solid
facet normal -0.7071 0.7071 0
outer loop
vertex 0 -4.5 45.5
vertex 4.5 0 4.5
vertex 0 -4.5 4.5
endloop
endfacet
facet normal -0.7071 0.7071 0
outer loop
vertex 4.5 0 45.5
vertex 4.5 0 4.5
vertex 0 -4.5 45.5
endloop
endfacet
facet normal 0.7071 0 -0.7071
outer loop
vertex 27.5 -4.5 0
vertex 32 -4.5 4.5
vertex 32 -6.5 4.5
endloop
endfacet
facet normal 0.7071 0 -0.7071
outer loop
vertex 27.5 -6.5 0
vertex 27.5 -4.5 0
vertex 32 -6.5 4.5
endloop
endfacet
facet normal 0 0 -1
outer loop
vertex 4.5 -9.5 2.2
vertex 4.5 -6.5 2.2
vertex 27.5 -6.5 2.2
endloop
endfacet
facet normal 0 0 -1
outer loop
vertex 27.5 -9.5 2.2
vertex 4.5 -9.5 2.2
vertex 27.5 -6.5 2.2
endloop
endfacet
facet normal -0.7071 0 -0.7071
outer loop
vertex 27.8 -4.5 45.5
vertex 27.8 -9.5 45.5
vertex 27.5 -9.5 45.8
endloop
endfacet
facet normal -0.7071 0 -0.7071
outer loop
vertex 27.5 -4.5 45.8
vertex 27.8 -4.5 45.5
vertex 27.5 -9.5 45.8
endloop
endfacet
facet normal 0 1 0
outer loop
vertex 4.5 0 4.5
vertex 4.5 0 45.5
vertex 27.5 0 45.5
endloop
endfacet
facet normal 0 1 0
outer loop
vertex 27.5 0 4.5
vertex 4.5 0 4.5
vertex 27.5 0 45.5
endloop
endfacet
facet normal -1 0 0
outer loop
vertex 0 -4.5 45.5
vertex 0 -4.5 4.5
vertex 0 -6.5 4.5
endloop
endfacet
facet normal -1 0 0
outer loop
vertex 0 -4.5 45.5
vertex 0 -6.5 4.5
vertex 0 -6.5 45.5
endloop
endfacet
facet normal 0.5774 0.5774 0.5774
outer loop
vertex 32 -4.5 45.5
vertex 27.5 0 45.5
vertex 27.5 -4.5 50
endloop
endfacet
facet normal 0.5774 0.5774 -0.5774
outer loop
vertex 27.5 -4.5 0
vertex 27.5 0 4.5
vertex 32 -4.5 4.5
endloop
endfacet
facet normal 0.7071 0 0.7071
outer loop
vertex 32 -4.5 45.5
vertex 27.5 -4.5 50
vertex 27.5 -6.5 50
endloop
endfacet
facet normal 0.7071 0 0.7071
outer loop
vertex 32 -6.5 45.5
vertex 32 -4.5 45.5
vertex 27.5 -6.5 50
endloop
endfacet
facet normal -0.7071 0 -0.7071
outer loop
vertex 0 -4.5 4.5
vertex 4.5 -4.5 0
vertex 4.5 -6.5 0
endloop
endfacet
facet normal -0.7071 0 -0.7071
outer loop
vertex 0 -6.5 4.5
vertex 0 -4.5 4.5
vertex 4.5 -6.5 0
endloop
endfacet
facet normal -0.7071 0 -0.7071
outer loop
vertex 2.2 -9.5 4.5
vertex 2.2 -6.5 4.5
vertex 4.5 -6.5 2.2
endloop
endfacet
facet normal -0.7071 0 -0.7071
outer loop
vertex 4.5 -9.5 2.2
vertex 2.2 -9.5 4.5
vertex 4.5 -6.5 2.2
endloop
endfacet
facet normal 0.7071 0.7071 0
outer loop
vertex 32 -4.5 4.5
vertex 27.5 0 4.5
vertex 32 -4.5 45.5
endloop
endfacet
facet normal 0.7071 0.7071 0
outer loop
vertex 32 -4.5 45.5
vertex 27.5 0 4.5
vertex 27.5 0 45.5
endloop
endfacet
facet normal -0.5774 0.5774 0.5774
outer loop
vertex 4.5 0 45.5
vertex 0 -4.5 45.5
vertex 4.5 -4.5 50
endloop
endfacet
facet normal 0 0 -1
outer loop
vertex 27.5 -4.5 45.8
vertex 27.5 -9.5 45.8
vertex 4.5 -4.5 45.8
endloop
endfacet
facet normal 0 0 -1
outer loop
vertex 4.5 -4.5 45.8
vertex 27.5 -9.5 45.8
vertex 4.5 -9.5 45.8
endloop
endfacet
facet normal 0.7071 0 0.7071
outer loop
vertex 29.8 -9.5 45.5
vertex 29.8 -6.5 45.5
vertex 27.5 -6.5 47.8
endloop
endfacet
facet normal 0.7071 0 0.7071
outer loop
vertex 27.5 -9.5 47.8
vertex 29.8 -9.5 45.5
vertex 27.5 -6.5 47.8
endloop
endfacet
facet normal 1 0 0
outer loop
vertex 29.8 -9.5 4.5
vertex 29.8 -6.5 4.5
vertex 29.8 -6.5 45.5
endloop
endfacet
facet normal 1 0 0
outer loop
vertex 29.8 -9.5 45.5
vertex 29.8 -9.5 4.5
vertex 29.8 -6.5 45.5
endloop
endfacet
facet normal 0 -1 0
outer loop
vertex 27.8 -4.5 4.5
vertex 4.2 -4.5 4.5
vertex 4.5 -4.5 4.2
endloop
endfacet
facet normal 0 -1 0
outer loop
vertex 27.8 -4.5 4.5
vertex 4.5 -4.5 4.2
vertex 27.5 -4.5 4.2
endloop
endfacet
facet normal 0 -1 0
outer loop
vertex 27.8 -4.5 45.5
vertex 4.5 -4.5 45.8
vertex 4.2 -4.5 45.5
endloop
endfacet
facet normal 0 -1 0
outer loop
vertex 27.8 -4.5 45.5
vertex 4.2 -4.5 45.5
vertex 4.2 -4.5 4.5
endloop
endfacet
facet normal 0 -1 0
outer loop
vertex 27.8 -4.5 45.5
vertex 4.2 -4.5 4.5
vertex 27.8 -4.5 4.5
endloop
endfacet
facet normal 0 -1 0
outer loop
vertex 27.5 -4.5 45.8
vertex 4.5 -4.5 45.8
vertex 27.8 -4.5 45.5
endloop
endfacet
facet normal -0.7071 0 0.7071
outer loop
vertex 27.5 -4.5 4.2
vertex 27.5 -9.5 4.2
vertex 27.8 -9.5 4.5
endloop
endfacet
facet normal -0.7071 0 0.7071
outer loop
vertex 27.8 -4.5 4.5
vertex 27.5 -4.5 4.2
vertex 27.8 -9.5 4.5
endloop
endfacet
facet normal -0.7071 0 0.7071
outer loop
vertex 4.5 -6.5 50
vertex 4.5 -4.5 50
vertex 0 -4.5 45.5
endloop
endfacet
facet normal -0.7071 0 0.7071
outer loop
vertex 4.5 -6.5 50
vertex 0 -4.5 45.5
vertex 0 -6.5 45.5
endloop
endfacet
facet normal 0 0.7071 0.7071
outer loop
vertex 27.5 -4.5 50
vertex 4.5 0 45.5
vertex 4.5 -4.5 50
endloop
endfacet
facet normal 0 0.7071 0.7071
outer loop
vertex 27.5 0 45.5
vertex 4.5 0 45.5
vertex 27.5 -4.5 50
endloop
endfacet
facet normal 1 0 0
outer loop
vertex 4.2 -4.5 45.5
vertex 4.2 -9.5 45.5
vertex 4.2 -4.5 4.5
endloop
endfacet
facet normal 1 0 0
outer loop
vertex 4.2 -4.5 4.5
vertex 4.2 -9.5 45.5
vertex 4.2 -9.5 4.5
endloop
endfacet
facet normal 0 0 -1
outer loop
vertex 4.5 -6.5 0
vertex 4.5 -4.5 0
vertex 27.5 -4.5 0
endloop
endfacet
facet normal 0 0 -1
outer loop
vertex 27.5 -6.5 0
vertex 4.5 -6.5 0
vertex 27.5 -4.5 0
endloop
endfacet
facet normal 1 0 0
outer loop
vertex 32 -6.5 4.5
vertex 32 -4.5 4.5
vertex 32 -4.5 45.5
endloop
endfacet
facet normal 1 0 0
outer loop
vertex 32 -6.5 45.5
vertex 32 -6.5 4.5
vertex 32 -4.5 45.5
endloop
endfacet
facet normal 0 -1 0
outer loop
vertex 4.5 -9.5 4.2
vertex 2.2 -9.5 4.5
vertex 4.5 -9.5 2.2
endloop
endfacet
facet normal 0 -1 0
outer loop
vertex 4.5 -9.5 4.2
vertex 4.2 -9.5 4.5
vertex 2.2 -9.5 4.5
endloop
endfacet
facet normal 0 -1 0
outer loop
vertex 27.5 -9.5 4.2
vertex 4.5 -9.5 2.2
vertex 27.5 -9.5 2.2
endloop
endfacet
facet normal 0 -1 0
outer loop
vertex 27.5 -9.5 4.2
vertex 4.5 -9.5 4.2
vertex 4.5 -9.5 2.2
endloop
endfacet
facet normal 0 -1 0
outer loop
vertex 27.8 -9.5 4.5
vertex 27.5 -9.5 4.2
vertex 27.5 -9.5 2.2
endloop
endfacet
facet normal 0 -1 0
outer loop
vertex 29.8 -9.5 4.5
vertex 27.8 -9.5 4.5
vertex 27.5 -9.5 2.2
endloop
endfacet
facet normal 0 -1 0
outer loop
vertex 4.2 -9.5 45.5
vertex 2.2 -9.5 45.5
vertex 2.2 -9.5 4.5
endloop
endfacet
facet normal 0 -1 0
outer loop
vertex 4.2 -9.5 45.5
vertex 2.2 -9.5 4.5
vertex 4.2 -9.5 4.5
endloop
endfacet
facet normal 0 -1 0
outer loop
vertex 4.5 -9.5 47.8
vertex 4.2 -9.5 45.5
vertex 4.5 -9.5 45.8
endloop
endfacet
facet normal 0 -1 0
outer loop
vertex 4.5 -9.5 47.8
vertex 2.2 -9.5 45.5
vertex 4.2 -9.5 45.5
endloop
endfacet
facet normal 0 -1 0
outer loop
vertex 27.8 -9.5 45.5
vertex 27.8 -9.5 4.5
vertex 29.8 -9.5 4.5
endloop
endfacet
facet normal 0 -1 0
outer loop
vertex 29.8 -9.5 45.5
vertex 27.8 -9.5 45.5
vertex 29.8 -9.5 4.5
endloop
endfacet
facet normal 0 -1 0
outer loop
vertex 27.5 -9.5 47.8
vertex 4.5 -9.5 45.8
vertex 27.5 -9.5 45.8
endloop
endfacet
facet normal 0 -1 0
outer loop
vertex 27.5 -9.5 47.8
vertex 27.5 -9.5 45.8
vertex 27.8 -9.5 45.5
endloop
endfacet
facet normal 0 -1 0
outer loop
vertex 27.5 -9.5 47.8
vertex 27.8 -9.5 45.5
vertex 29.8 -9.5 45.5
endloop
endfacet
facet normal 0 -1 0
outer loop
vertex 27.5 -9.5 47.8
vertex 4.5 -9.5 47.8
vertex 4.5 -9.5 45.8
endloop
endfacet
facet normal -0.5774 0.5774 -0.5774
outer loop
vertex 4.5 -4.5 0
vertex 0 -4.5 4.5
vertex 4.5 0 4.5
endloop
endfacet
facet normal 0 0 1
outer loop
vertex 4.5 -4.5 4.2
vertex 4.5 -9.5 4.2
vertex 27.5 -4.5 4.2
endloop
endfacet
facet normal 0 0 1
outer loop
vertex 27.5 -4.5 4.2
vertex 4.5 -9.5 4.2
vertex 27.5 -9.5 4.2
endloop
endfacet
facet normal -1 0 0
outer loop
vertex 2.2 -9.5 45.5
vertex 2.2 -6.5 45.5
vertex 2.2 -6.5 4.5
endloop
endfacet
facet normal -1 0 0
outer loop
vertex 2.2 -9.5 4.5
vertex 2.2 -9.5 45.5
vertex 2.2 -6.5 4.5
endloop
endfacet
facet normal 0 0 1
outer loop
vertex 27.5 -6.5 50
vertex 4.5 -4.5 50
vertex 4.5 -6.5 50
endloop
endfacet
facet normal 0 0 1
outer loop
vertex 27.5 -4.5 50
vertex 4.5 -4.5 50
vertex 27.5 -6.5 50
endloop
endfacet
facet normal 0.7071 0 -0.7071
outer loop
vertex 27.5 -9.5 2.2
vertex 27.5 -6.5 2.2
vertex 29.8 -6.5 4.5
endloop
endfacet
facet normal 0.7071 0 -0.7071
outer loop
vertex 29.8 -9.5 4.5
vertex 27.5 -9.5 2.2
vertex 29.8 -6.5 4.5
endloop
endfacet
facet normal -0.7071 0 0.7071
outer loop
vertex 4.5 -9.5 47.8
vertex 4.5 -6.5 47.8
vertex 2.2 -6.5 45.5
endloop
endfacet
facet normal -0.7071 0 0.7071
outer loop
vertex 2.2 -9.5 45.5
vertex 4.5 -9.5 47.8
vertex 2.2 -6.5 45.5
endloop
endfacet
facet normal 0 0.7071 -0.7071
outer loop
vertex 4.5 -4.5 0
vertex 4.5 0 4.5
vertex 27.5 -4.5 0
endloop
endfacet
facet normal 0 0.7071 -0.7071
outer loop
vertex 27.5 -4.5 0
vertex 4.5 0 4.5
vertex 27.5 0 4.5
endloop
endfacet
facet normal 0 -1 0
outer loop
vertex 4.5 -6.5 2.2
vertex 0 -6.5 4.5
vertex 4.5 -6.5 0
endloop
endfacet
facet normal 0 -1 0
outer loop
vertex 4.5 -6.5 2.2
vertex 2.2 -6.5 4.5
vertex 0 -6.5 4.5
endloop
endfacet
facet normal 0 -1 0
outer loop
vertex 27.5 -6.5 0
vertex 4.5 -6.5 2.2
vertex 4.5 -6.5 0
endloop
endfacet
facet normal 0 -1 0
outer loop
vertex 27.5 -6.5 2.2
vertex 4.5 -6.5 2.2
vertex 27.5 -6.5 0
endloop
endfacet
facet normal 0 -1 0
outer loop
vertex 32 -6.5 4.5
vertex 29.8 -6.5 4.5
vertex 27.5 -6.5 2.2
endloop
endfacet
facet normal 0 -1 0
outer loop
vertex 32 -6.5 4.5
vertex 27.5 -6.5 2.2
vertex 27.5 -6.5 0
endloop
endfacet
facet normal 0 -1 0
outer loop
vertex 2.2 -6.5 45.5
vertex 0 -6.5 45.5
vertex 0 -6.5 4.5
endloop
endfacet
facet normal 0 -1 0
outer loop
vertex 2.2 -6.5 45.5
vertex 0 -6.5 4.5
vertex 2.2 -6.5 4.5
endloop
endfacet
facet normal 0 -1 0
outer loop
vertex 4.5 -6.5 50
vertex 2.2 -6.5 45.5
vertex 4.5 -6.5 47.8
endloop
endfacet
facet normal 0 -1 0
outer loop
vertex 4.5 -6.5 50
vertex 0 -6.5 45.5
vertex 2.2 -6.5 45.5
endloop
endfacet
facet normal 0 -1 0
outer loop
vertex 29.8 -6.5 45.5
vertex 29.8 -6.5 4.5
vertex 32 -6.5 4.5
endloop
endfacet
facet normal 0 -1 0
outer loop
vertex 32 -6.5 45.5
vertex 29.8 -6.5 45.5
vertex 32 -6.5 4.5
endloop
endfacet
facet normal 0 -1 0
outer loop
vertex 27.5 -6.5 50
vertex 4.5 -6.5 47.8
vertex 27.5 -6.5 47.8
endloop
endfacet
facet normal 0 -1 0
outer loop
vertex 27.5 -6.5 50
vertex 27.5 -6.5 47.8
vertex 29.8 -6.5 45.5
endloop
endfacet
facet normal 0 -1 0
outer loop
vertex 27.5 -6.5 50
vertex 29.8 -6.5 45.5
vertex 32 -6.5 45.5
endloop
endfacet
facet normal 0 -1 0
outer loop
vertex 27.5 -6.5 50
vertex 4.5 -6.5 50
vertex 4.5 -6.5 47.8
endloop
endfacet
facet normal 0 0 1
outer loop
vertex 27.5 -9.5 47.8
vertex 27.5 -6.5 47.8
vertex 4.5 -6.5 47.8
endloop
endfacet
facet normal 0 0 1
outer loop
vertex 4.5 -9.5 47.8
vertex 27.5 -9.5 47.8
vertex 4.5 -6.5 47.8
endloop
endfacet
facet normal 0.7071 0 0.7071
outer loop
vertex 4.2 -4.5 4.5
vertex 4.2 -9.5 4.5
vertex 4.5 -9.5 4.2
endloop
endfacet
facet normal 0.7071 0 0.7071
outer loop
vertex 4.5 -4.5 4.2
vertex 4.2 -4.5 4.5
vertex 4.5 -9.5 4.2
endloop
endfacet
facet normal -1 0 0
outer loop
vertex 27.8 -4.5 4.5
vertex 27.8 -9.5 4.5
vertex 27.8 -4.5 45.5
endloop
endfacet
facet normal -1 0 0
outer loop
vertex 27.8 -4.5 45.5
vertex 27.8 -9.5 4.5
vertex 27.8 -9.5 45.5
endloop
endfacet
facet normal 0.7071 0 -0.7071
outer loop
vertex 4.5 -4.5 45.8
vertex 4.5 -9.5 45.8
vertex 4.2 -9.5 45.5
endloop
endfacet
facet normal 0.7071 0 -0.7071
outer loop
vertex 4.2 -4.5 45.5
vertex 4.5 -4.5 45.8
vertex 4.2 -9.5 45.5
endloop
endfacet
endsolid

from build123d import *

# Parameters (mm, degrees)
F0_W     = 32
F0_H     = 50
F1_DEPTH = 15
F2_SIZE  = 4.5
F3_W     = 44.522483
F3_H     = 61.777794
F4_DEPTH = 8.5
F6_DEPTH = 3
F8_DEPTH = 5


with BuildPart() as f1:
    # F0 (on Front) → F1 (new body)
    with BuildSketch(Plane.XZ):
        with Locations((16, 25)):
            Rectangle(F0_W, F0_H)
    extrude(amount=F1_DEPTH)

    # F2
    f2_edges = [f1.edges().sort_by_distance(p)[0] for p in [
        (0, -7.5, 50),
        (0, -7.5, 0),
        (0, 0, 25),
        (0, -15, 25),
        (16, 0, 0),
        (32, 0, 25),
        (16, 0, 50),
        (32, -7.5, 50),
        (16, -15, 50),
        (32, -7.5, 0),
        (32, -15, 25),
        (16, -15, 0),
    ]]
    chamfer(f2_edges, length=F2_SIZE)

    # F3 (on face) → F4 (cut)
    with BuildSketch(Plane.XZ.offset(15)):
        with Locations((18.562658, 27.901019)):
            Rectangle(F3_W, F3_H)
    extrude(amount=-F4_DEPTH, mode=Mode.SUBTRACT)

    # F5 (on face) → F6 (join)
    with BuildSketch(Plane.XZ.offset(6.5)):
        Polygon((2.2, 4.5), (4.5, 2.2), (27.5, 2.2), (29.8, 4.5), (29.8, 45.5), (27.5, 47.8), (4.5, 47.8), (2.2, 45.5), align=None)
    extrude(amount=F6_DEPTH)

    # F7 (on face) → F8 (cut)
    with BuildSketch(Plane.XZ.offset(9.5)):
        Polygon((4.2, 4.5), (4.5, 4.2), (27.5, 4.2), (27.8, 4.5), (27.8, 45.5), (27.5, 45.8), (4.5, 45.8), (4.2, 45.5), align=None)
    extrude(amount=-F8_DEPTH, mode=Mode.SUBTRACT)


solid = f1.part
